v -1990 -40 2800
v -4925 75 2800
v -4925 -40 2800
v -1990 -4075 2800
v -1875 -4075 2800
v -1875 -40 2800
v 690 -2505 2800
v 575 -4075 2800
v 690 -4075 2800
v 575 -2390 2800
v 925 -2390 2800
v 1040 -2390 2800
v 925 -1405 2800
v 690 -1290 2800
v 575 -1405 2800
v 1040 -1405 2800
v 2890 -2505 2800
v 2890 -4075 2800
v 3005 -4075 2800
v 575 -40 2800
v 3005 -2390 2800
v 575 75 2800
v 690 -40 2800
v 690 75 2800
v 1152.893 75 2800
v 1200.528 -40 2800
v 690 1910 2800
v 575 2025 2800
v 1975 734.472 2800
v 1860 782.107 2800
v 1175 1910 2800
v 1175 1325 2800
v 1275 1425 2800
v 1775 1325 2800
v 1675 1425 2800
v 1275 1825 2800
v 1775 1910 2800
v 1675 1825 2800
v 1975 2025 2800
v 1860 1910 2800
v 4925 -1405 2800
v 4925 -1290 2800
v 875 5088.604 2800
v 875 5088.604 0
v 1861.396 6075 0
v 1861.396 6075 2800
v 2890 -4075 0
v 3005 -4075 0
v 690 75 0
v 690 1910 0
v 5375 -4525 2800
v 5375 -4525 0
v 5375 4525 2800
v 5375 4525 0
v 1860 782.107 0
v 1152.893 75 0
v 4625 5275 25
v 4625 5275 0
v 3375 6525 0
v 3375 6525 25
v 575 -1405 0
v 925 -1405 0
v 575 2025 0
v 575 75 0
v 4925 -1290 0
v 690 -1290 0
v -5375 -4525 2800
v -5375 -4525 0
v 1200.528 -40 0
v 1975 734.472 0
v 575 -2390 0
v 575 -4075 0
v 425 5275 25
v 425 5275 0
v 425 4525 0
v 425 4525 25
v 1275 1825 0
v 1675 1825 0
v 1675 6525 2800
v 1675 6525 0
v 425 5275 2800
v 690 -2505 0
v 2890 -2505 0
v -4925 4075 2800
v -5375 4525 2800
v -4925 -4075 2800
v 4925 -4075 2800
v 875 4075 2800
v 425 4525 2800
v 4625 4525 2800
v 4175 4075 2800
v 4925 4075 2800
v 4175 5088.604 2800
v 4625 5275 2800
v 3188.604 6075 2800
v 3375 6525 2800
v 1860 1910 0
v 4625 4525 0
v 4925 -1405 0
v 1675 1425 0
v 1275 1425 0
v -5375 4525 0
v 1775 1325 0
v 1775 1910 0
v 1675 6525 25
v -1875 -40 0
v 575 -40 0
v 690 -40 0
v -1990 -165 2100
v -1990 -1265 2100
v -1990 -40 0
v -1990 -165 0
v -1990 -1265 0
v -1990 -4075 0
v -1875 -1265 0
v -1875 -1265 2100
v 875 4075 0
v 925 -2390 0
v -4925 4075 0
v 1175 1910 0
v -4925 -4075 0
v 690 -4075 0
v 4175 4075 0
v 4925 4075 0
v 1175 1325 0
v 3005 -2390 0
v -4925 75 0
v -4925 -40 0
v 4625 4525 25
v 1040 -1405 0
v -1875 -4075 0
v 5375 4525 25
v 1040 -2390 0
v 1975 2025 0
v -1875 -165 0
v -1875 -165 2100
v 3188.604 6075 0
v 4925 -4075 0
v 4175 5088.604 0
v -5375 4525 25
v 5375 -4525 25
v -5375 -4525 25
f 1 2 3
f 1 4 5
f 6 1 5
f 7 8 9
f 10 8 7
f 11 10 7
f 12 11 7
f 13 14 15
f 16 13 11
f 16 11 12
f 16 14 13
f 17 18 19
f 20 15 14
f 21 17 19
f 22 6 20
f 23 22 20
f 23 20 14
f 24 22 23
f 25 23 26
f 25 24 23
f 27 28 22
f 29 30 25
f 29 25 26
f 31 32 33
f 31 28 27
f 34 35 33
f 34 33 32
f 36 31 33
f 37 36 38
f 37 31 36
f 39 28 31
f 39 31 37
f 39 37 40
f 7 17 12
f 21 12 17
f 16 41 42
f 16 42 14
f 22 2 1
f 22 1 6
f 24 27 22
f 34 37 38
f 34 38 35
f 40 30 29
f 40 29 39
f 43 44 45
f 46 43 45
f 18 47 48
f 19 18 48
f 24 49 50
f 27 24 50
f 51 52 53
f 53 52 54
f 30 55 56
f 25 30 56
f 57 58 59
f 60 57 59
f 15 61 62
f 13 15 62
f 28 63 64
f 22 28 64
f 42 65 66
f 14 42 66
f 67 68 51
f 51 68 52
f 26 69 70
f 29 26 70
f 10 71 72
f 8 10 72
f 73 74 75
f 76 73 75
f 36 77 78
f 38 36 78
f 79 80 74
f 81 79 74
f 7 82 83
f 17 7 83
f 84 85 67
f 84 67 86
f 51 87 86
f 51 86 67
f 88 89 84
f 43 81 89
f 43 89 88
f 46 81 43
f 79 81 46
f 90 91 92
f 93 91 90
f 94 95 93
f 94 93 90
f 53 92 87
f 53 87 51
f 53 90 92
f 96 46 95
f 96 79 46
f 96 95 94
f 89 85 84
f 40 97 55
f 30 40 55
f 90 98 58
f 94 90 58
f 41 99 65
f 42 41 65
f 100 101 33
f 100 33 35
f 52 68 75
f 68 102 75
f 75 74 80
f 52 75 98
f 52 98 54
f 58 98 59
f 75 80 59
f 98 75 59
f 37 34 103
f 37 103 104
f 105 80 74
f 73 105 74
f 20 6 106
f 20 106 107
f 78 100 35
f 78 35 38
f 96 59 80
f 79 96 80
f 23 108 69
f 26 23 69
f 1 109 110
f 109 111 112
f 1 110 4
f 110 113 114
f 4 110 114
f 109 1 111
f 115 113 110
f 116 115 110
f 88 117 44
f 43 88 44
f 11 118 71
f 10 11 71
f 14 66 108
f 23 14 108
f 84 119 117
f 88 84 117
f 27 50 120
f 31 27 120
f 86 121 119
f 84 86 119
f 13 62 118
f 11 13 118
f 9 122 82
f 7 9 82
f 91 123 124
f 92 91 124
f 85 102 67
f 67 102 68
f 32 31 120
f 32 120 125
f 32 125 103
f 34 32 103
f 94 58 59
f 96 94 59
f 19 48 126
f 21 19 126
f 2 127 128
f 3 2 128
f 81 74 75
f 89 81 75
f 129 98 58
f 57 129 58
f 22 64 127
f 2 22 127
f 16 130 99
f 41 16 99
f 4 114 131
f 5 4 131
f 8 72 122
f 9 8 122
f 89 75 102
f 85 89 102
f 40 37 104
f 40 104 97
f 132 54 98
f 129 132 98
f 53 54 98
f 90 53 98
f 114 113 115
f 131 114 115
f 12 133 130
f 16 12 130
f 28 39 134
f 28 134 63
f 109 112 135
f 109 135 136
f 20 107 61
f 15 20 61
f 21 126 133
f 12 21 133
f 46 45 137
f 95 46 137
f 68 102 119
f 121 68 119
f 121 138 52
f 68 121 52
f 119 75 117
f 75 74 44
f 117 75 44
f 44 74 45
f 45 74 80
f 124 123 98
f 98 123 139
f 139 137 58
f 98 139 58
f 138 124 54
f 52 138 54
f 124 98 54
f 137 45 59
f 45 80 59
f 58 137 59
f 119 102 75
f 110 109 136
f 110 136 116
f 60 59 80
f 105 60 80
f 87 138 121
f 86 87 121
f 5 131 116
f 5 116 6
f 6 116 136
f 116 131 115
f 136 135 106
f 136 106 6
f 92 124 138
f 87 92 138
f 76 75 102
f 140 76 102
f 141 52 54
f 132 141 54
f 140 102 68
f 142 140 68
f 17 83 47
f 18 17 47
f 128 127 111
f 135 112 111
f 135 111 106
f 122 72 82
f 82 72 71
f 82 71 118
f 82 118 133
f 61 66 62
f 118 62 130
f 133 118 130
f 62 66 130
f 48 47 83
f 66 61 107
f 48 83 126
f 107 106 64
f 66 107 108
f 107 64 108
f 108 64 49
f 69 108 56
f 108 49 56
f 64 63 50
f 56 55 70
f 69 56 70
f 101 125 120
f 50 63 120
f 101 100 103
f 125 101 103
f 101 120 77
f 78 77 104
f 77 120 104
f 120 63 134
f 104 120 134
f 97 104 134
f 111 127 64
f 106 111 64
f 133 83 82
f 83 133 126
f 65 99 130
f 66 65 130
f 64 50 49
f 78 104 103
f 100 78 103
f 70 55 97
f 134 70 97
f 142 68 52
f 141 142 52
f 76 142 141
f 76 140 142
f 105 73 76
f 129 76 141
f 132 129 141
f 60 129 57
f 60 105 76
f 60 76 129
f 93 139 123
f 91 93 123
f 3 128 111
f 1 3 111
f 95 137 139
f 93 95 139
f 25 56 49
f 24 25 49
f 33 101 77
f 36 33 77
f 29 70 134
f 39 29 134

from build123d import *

# Parameters (mm, degrees)
F0_W     = 2935
F0_H     = 4035
F0_W_2   = 400
F0_H_2   = 400
F0_W_3   = 2200
F0_H_3   = 1570
F1_DEPTH = 25
F2_DEPTH = 2800
F3_DEPTH = 2800
F4_W     = 1100
F4_H     = 2100
F5_DEPTH = 115


with BuildPart() as f1:
    # F0 (on Top) → F1 (new body)
    with BuildSketch(Plane.XY):
        Polygon((-5375, -4525), (5375, -4525), (5375, 4525), (4625, 4525), (4625, 5275), (3375, 6525), (2956.3961030679, 6525), (2086.3961030679, 6525), (1675, 6525), (425, 5275), (425, 4525), (-149.870057106, 4525), (-1879.870057106, 4525), (-2737.3004150391, 4525), (-4467.3004150391, 4525), (-5375, 4525), align=None)
        Polygon((-149.870057106, 4075), (875, 4075), (875, 5088.6038969321), (1861.3961030679, 6075), (2086.3961030679, 6075), (2956.3961030679, 6075), (3188.6038969321, 6075), (4175, 5088.6038969321), (4175, 4075), (4925, 4075), (4925, 2025), (4925, -1290), (4925, -1405), (4925, -4075), (3005, -4075), (2890, -4075), (690, -4075), (575, -4075), (-1875, -4075), (-1990, -4075), (-4925, -4075), (-4925, -40), (-4925, 75), (-4925, 4075), (-4467.3004150391, 4075), (-2737.3004150391, 4075), (-1879.870057106, 4075), align=None, mode=Mode.SUBTRACT)
        Polygon((875, 5088.6038969321), (875, 4075), (-149.870057106, 4075), (-1879.870057106, 4075), (-2737.3004150391, 4075), (-4467.3004150391, 4075), (-4925, 4075), (-4925, 75), (-1875, 75), (575, 75), (575, 2025), (1975, 2025), (4925, 2025), (4925, 4075), (4175, 4075), (4175, 5088.6038969321), (3188.6038969321, 6075), (2956.3961030679, 6075), (2086.3961030679, 6075), (1861.3961030679, 6075), align=None)
        with Locations((-3457.5, -2057.5)):
            Rectangle(F0_W, F0_H)
        Polygon((4925, -1290), (4925, 2025), (1975, 2025), (1975, 734.4722215136), (1200.5277784864, -40), (690, -40), (690, -1290), align=None)
        Polygon((-1875, -775), (-1875, -4075), (575, -4075), (575, -2390), (925, -2390), (925, -1405), (575, -1405), (575, -1290), (575, -40), (-1875, -40), align=None)
        Polygon((4925, -4075), (4925, -1405), (1040, -1405), (1040, -2390), (3005, -2390), (3005, -4075), align=None)
        Polygon((-1875, 75), (-4925, 75), (-4925, -40), (-1990, -40), (-1990, -4075), (-1875, -4075), (-1875, -775), (-1875, -40), (575, -40), (575, -1290), (575, -1405), (925, -1405), (925, -2390), (575, -2390), (575, -4075), (690, -4075), (690, -2505), (2890, -2505), (2890, -4075), (3005, -4075), (3005, -2390), (1040, -2390), (1040, -1405), (4925, -1405), (4925, -1290), (690, -1290), (690, -40), (1200.5277784864, -40), (1975, 734.4722215136), (1975, 2025), (575, 2025), (575, 75), align=None)
        Polygon((1152.8932188135, 75), (690, 75), (690, 1910), (1175, 1910), (1175, 1325), (1775, 1325), (1775, 1910), (1860, 1910), (1860, 782.1067811865), align=None, mode=Mode.SUBTRACT)
        with Locations((1475, 1625)):
            Rectangle(F0_W_2, F0_H_2, mode=Mode.SUBTRACT)
        with Locations((1790, -3290)):
            Rectangle(F0_W_3, F0_H_3)
        Polygon((690, 1910), (690, 75), (1152.8932188135, 75), (1860, 782.1067811865), (1860, 1910), (1775, 1910), (1775, 1325), (1175, 1325), (1175, 1910), align=None)
        with Locations((1475, 1625)):
            Rectangle(F0_W_2, F0_H_2)
    extrude(amount=F1_DEPTH)


with BuildPart() as f2:
    # F0 (on Top) → F2 (new body)
    with BuildSketch(Plane.XY):
        Polygon((-5375, -4525), (5375, -4525), (5375, 4525), (4625, 4525), (4625, 5275), (3375, 6525), (2956.3961030679, 6525), (2086.3961030679, 6525), (1675, 6525), (425, 5275), (425, 4525), (-149.870057106, 4525), (-1879.870057106, 4525), (-2737.3004150391, 4525), (-4467.3004150391, 4525), (-5375, 4525), align=None)
        Polygon((-149.870057106, 4075), (875, 4075), (875, 5088.6038969321), (1861.3961030679, 6075), (2086.3961030679, 6075), (2956.3961030679, 6075), (3188.6038969321, 6075), (4175, 5088.6038969321), (4175, 4075), (4925, 4075), (4925, 2025), (4925, -1290), (4925, -1405), (4925, -4075), (3005, -4075), (2890, -4075), (690, -4075), (575, -4075), (-1875, -4075), (-1990, -4075), (-4925, -4075), (-4925, -40), (-4925, 75), (-4925, 4075), (-4467.3004150391, 4075), (-2737.3004150391, 4075), (-1879.870057106, 4075), align=None, mode=Mode.SUBTRACT)
    extrude(amount=F2_DEPTH)


with BuildPart() as f3:
    # F0 (on Top) → F3 (new body, through all)
    with BuildSketch(Plane.XY):
        Polygon((-1875, 75), (-4925, 75), (-4925, -40), (-1990, -40), (-1990, -4075), (-1875, -4075), (-1875, -775), (-1875, -40), (575, -40), (575, -1290), (575, -1405), (925, -1405), (925, -2390), (575, -2390), (575, -4075), (690, -4075), (690, -2505), (2890, -2505), (2890, -4075), (3005, -4075), (3005, -2390), (1040, -2390), (1040, -1405), (4925, -1405), (4925, -1290), (690, -1290), (690, -40), (1200.5277784864, -40), (1975, 734.4722215136), (1975, 2025), (575, 2025), (575, 75), align=None)
        Polygon((1152.8932188135, 75), (690, 75), (690, 1910), (1175, 1910), (1175, 1325), (1775, 1325), (1775, 1910), (1860, 1910), (1860, 782.1067811865), align=None, mode=Mode.SUBTRACT)
        with Locations((1475, 1625)):
            Rectangle(F0_W_2, F0_H_2, mode=Mode.SUBTRACT)
    extrude(amount=F3_DEPTH)

    # F4 (on face) → F5 (cut, through all)
    with BuildSketch(Plane(origin=(-1990, 0, 0), x_dir=(0, -1, 0), z_dir=(-1, 0, 0))):
        with Locations((715, 1050)):
            Rectangle(F4_W, F4_H)
    extrude(amount=-F5_DEPTH, mode=Mode.SUBTRACT)


solid = Compound([f1.part, f2.part, f3.part])
